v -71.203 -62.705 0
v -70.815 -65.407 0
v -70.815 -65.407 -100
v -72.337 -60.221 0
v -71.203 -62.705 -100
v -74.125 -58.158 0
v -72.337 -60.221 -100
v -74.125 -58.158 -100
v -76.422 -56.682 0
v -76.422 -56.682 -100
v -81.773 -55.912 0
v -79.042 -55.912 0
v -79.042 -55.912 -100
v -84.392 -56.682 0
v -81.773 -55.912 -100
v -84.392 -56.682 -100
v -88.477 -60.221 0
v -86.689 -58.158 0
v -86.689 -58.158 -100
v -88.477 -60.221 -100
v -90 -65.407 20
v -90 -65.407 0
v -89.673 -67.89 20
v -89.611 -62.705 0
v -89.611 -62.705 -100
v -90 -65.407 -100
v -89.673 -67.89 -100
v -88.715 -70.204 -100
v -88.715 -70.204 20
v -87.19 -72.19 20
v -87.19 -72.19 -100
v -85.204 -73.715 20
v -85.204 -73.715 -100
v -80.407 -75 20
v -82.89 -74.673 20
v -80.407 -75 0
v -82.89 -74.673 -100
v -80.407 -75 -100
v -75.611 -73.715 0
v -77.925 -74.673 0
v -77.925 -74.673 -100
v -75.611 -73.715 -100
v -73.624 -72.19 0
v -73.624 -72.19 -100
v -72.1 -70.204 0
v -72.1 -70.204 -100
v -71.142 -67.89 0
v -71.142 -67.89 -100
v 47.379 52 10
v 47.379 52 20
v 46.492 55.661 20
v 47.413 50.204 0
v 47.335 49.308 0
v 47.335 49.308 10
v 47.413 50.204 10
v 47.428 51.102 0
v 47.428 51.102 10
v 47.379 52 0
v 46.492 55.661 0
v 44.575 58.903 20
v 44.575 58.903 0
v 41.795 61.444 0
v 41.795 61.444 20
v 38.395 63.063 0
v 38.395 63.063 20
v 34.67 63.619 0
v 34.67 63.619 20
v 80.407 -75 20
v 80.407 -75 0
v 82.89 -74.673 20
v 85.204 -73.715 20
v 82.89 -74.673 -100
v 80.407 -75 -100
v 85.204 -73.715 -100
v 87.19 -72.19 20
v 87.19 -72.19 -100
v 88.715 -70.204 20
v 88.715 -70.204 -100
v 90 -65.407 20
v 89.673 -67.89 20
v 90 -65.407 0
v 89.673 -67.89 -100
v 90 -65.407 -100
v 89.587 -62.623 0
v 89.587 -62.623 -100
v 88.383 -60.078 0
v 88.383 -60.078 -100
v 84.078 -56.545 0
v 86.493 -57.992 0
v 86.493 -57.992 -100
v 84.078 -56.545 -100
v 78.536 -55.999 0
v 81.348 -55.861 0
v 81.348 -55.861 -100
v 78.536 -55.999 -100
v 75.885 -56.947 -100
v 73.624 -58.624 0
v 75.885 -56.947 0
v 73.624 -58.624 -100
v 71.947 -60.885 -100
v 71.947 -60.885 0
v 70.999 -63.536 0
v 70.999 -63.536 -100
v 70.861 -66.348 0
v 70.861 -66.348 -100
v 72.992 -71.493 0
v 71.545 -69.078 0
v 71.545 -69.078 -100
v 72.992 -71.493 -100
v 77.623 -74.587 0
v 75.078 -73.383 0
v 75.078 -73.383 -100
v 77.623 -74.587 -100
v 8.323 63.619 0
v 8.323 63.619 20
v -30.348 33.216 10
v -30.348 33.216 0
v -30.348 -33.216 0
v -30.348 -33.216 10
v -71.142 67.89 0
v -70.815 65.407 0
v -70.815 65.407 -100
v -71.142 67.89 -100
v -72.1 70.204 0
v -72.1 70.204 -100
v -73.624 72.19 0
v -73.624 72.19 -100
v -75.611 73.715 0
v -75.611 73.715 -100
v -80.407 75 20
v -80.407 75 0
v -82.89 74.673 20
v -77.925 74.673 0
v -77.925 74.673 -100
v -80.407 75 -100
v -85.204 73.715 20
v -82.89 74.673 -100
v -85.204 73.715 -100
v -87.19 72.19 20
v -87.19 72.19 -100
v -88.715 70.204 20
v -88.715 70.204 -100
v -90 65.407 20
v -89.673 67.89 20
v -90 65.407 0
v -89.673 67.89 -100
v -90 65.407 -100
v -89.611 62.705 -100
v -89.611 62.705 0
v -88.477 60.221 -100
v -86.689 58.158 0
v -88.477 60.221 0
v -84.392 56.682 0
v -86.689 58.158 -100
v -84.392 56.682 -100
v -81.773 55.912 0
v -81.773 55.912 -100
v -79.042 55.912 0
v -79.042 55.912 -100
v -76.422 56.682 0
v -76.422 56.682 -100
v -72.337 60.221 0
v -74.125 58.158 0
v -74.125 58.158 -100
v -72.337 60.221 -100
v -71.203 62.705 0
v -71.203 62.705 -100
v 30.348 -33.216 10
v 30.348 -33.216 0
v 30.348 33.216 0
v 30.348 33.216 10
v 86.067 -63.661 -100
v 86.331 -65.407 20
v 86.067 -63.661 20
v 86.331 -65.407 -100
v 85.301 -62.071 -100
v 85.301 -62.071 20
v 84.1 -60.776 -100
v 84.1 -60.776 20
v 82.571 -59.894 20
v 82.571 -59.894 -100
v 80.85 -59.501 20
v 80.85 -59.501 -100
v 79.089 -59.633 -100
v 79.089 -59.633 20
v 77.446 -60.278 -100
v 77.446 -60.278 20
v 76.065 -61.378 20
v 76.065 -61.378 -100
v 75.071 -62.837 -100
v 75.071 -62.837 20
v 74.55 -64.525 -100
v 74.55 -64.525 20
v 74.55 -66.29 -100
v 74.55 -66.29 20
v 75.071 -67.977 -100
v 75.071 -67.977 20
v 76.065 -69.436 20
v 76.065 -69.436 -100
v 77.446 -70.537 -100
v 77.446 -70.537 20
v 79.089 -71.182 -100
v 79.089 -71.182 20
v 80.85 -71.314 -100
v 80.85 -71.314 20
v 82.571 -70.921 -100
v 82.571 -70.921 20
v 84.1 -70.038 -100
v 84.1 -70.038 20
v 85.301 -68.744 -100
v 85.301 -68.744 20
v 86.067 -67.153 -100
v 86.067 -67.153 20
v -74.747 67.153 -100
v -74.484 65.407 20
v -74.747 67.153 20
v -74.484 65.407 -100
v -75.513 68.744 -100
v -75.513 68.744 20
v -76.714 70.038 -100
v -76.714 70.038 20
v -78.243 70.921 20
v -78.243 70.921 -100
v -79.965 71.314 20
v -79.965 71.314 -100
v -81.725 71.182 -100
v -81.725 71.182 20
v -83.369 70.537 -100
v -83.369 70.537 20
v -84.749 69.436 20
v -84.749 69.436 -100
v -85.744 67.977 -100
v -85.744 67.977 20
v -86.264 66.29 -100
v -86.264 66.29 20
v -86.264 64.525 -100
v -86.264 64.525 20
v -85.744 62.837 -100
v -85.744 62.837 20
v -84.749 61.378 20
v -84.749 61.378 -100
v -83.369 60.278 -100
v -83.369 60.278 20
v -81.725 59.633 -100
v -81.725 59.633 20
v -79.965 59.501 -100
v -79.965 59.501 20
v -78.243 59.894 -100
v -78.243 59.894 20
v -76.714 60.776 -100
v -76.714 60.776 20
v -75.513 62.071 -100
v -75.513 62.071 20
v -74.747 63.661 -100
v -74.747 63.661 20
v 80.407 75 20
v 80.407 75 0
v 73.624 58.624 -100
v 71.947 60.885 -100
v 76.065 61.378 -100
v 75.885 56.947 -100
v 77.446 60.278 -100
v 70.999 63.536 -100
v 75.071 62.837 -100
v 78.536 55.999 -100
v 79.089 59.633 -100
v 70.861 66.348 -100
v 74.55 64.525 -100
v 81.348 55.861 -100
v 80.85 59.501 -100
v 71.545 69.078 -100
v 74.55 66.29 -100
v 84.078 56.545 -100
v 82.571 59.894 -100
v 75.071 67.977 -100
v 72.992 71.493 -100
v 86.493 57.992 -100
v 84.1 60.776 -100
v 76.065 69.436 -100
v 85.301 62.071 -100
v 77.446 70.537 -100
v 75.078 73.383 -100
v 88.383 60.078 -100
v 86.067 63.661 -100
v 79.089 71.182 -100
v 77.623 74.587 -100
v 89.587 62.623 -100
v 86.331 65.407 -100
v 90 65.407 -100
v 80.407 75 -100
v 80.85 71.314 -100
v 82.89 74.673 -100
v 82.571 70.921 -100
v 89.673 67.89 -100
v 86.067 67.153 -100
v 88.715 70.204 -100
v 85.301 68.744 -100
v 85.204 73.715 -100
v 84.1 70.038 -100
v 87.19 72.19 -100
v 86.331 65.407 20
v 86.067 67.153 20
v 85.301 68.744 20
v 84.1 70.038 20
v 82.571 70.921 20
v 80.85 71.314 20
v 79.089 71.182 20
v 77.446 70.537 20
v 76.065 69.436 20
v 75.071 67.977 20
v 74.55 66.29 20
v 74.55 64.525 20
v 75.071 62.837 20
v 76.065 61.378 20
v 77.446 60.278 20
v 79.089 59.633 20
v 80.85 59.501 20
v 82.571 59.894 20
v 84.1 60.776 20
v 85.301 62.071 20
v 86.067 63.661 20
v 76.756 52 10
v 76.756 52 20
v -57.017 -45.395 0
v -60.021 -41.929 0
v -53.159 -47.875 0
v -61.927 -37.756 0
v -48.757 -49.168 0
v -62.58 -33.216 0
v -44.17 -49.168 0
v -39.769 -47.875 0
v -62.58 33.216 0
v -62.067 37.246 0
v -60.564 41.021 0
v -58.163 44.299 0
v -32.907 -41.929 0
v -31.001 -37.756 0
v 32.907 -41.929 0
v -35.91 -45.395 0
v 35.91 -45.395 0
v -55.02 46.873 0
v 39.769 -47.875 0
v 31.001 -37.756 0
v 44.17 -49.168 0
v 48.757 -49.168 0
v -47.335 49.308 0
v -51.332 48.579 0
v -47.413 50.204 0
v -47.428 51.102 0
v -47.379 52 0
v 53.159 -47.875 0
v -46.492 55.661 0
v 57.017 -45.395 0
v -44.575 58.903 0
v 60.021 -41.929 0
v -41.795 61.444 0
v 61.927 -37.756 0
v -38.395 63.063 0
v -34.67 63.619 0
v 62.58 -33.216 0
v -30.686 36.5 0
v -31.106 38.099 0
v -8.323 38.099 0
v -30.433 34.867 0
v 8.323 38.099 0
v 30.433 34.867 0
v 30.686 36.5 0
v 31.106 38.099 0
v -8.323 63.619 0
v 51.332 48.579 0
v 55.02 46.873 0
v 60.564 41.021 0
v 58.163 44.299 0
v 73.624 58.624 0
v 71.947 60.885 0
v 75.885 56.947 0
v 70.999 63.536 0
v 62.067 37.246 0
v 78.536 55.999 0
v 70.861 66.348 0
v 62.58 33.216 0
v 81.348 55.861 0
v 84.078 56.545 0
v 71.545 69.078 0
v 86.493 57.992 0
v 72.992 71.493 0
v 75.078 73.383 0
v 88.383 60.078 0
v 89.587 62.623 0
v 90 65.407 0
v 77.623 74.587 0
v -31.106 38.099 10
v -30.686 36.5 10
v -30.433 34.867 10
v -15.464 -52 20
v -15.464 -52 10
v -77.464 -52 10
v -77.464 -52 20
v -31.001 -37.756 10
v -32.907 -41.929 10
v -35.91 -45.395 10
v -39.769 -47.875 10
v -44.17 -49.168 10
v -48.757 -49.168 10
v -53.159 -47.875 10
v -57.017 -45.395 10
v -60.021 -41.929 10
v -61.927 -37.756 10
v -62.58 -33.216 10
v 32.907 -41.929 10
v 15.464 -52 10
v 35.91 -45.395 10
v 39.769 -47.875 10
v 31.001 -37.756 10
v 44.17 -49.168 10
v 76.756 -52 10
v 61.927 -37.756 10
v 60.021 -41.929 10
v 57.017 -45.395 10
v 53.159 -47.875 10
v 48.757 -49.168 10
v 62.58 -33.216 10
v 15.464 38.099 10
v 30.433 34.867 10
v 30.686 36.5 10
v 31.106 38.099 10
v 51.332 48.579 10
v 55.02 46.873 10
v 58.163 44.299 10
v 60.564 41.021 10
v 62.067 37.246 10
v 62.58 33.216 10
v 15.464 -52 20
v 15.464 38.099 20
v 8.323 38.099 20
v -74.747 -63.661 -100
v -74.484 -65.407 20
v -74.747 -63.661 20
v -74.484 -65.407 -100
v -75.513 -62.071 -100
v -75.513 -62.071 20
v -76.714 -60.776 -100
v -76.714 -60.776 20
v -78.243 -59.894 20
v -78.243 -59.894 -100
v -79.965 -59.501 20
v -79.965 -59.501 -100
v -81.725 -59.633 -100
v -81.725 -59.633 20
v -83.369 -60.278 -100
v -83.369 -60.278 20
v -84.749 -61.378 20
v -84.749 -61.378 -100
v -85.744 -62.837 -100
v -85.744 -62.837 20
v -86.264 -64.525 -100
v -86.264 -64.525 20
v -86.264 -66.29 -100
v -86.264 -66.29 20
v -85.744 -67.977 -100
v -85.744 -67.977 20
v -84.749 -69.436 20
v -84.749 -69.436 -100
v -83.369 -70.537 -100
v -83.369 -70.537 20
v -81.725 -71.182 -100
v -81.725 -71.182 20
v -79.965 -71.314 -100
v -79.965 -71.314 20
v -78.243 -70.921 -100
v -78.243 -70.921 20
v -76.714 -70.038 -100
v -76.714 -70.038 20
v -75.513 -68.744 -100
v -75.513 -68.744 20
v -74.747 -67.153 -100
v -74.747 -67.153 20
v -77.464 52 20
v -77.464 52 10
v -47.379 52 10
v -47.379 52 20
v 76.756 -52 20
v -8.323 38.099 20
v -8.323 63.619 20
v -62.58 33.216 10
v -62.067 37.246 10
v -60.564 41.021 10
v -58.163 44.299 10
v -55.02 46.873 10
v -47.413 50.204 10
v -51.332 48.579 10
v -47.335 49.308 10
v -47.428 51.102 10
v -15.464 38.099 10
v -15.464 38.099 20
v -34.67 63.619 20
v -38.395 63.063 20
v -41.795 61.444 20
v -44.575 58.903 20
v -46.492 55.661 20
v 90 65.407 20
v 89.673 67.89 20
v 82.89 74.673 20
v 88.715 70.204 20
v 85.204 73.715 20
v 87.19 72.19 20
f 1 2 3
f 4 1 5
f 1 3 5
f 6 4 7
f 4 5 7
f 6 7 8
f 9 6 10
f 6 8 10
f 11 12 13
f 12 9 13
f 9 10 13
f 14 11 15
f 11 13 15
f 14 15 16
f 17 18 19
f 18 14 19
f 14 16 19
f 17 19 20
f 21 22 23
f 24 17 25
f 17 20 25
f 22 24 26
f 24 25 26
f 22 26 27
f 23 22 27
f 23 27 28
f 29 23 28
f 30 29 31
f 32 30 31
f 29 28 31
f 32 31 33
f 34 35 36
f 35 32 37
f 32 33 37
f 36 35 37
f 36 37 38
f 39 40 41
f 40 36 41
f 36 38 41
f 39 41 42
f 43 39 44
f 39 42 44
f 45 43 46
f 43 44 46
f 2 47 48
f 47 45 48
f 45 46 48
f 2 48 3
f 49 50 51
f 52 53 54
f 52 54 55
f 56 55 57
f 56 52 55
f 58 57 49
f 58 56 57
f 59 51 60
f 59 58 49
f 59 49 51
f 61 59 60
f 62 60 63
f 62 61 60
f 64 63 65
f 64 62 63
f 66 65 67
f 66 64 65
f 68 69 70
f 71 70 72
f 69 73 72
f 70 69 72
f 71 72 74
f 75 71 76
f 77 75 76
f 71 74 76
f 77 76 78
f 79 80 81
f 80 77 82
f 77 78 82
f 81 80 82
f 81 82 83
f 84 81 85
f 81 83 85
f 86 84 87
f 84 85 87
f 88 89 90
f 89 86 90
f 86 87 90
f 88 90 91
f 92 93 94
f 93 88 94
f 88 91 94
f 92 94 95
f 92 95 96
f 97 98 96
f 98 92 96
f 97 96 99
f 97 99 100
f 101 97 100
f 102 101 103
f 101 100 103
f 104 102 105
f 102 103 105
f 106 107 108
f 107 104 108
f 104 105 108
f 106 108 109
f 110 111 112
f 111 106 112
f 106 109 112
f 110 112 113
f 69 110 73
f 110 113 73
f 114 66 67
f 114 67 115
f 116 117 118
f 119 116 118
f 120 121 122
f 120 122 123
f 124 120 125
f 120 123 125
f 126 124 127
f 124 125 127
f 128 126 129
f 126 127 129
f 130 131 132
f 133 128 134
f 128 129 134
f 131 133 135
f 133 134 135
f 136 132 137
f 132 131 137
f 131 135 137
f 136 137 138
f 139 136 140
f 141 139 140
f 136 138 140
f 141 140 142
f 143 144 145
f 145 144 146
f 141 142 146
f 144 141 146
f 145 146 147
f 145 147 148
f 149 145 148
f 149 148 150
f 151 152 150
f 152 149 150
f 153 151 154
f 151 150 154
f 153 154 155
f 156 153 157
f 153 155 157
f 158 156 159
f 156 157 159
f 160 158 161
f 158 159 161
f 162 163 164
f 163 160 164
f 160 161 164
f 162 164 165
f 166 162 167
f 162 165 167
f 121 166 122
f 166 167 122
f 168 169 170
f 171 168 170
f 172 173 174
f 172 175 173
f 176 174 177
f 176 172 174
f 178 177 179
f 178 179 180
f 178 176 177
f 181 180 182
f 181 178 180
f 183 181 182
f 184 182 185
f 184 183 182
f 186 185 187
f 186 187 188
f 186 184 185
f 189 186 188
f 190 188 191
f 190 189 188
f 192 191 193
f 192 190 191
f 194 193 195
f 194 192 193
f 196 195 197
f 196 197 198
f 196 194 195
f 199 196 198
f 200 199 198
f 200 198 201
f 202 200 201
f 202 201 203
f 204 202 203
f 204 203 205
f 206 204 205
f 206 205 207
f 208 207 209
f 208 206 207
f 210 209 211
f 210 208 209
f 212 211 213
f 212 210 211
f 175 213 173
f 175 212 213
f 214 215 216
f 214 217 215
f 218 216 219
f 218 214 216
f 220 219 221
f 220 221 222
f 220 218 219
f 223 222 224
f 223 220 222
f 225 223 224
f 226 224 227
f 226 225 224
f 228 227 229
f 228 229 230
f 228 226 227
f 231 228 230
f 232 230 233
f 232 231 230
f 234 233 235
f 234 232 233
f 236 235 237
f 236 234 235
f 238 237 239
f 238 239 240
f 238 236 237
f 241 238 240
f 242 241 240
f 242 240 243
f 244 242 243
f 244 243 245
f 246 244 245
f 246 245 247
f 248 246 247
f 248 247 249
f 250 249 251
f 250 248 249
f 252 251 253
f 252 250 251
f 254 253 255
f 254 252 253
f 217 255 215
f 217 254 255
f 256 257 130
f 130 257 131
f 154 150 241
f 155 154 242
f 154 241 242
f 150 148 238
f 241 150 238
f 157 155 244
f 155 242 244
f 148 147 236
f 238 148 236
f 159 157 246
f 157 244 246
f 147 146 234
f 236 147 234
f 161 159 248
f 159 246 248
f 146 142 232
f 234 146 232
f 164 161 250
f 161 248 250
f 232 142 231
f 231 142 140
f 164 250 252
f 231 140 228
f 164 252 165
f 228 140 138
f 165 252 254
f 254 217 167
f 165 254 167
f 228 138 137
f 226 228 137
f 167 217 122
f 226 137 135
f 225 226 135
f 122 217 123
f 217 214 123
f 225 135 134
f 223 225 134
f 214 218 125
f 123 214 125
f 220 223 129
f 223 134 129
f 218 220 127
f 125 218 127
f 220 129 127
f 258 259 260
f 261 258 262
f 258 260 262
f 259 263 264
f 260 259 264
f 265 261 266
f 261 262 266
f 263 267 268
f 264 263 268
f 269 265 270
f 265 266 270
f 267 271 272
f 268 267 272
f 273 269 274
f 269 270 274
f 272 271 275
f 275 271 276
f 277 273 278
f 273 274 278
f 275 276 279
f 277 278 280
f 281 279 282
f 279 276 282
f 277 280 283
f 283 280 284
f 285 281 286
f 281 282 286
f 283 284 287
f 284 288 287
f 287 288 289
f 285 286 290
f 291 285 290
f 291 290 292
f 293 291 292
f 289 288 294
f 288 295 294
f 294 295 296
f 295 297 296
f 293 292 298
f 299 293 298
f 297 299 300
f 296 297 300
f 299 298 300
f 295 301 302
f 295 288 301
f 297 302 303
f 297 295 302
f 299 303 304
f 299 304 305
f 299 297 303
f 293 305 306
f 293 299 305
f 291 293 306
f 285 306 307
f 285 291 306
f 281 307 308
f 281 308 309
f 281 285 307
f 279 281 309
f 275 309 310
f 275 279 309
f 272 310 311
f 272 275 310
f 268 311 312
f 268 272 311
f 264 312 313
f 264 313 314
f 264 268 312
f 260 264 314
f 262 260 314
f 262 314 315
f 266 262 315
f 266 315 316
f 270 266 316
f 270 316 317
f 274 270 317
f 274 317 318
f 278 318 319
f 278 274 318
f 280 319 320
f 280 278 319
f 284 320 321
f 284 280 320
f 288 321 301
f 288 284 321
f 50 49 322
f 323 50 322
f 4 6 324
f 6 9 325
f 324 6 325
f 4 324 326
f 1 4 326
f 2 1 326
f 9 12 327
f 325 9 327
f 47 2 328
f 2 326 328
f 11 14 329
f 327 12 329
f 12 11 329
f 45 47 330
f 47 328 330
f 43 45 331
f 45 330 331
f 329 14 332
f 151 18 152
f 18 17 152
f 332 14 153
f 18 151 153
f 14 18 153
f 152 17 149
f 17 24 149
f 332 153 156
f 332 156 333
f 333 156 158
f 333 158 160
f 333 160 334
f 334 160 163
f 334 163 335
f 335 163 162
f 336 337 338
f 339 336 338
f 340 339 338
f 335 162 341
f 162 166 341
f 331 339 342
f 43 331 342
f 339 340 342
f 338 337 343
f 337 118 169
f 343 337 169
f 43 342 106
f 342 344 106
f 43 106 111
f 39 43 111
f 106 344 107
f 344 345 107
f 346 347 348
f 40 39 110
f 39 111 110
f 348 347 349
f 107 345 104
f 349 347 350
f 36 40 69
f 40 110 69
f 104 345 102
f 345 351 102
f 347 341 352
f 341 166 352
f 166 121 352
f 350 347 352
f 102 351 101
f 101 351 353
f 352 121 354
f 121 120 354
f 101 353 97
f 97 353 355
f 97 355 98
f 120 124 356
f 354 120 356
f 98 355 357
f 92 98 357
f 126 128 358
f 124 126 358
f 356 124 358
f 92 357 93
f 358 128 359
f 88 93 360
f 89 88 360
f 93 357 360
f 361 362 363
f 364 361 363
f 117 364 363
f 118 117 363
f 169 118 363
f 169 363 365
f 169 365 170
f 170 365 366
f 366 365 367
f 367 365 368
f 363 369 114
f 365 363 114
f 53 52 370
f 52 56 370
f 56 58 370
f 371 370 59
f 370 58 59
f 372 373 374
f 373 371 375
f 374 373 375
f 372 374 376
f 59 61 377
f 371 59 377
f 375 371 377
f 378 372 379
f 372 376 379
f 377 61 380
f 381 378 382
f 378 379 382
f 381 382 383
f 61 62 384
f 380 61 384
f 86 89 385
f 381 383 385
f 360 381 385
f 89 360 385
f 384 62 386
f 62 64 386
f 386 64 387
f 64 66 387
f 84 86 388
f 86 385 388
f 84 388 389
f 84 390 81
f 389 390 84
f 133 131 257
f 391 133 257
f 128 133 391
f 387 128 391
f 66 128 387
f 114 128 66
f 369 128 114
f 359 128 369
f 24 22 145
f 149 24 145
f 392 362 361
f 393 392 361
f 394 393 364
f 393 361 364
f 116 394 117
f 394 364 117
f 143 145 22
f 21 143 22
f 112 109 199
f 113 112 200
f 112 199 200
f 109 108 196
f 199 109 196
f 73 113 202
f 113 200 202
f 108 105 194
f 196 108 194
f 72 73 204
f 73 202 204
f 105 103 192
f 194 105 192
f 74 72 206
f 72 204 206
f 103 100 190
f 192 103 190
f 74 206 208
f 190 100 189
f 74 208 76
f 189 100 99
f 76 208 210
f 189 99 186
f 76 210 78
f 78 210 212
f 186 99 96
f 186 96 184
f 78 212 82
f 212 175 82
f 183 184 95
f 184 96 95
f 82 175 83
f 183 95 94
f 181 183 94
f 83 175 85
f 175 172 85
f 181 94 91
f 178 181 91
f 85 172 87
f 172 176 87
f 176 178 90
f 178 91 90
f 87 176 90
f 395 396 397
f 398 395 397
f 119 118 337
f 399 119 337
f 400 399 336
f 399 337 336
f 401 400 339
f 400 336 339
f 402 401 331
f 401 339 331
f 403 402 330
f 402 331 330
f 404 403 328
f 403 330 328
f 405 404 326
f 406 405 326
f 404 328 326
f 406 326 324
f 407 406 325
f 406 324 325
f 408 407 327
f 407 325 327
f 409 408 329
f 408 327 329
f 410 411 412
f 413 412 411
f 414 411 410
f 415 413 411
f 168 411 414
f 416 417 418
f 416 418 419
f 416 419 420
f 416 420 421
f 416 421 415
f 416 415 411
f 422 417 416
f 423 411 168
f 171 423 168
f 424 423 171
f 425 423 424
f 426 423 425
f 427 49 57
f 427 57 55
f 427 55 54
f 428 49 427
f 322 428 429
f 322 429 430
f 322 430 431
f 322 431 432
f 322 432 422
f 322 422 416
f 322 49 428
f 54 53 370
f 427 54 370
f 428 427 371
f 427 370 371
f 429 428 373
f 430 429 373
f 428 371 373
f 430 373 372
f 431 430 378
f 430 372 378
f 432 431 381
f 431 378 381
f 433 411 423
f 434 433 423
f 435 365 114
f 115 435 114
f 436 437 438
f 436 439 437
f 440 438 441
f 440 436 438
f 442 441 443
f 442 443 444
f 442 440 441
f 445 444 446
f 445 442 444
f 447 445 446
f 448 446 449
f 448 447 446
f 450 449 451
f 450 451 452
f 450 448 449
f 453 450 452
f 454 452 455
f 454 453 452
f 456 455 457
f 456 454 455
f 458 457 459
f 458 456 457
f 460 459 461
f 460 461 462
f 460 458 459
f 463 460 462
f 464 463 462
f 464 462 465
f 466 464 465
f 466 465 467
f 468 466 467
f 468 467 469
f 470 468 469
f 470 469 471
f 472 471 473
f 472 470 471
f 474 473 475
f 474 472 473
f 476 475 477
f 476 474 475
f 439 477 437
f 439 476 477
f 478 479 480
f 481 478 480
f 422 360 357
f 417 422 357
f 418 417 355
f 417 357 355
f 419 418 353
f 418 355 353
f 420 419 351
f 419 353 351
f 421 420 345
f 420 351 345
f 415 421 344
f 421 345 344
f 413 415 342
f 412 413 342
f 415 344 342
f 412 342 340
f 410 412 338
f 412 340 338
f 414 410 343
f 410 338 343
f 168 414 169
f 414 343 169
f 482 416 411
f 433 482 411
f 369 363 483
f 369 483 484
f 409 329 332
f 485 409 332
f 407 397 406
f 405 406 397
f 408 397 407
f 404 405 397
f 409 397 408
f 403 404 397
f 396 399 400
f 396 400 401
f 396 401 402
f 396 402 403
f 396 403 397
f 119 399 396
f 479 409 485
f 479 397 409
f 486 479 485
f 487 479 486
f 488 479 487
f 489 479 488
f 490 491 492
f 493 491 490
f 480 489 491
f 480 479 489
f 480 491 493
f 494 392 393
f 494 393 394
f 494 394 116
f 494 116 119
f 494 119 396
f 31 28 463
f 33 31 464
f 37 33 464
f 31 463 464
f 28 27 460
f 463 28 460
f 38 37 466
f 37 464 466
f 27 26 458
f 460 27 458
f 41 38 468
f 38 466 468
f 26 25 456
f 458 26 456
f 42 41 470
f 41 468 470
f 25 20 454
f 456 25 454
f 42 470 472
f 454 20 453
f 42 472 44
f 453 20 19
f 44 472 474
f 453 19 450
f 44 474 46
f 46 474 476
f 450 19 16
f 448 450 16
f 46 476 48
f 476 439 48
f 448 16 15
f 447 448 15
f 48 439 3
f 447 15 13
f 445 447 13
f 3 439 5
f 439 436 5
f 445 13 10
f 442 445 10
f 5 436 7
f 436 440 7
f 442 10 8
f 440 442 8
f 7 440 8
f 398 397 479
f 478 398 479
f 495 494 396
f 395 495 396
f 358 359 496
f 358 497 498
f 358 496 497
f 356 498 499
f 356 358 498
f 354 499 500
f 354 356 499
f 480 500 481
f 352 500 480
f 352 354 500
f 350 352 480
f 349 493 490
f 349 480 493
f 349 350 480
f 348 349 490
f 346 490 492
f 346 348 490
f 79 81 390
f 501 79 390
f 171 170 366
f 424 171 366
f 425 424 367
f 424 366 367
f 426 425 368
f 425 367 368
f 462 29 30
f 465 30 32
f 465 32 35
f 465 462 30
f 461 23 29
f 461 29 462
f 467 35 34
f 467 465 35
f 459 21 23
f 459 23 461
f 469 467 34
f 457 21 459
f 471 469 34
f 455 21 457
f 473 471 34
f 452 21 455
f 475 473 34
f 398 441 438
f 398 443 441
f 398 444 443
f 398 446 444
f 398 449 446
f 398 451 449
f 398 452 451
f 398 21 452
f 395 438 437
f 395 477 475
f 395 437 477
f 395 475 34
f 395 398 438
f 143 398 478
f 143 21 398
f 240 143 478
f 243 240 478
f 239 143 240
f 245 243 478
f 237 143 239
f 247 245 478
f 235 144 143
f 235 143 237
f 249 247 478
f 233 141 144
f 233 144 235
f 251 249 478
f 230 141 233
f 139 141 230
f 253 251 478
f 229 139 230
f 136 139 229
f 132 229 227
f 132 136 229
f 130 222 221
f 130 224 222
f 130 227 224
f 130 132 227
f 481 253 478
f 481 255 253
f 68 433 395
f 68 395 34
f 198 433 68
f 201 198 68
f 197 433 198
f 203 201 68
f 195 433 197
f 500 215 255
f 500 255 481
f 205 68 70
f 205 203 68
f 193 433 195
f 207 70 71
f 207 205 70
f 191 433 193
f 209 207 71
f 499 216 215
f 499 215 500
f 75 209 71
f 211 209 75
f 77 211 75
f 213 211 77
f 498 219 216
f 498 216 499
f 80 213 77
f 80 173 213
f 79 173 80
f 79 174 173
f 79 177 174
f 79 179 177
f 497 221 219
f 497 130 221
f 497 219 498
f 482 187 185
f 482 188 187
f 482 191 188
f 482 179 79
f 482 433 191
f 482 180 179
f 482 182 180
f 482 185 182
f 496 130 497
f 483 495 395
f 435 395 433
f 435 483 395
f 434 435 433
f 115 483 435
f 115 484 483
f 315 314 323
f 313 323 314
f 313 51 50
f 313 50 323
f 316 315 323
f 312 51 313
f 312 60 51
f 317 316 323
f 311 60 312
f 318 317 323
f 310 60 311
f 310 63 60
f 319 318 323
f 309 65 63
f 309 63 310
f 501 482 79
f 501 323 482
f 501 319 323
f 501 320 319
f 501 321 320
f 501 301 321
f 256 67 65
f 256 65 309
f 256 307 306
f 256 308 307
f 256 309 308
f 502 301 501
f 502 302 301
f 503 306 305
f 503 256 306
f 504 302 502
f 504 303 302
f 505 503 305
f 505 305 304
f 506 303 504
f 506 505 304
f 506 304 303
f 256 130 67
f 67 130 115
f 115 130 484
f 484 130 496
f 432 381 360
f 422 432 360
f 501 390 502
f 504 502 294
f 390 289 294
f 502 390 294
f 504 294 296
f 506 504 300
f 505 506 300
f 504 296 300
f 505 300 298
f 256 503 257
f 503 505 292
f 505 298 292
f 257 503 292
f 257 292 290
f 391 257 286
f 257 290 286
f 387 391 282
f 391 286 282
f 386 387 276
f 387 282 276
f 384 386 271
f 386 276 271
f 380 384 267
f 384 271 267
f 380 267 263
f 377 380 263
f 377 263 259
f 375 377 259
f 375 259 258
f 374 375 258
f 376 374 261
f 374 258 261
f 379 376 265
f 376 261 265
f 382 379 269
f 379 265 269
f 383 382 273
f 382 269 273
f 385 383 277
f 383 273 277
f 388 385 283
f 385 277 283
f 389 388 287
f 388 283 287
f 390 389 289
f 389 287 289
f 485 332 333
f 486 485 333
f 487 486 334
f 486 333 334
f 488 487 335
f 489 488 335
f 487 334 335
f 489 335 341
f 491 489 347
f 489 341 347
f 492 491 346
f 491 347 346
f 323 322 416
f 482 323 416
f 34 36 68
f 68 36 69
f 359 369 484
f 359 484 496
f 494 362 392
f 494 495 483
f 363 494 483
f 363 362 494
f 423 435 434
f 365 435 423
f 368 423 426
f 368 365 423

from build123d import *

# Parameters (mm, degrees)
EXTRUDE_1_DEPTH          = 20
EXTRUDE_2_DEPTH          = 10
EXTRUDE_3_DEPTH          = 20
CUT_EXTRUDE_4_DEPTH      = 5
EXTRUDE_START            = -100
SKETCH_1_11_R            = 9.592658998
SKETCH_1_11_R_2          = 5.923282924
EXTRUDE_5_DEPTH          = 100
EXTRUDE_5_2_DEPTH        = 100
EXTRUDE_5_3_DEPTH        = 100
EXTRUDE_5_4_DEPTH        = 100
CUT_EXTRUDE_5_DEPTH      = 155.029218007
CUT_EXTRUDE_5_DEPTH_BACK = 12
SKETCH_1_15_R            = 9.592658998
SKETCH_1_15_R_2          = 5.923282924
EXTRUDE_7_DEPTH          = 20


with BuildPart() as part:
    # 草图1 → 凸台-拉伸1 (new body)
    with BuildSketch(Plane.XY):
        with BuildLine():
            Line((80.407341002, 75), (-80.407341002, 75))
            ThreePointArc((-80.407341002, 75), (-73.624306776, 72.190375229), (-70.814682005, 65.407341002))
            ThreePointArc((-70.814682005, 65.407341002), (-80.407341002, 55.814682005), (-90, 65.407341002))
            Line((-90, 65.407341002), (-90, -65.407341002))
            ThreePointArc((-90, -65.407341002), (-80.407341002, -55.814682005), (-70.814682005, -65.407341002))
            ThreePointArc((-70.814682005, -65.407341002), (-73.624306776, -72.190375229), (-80.407341002, -75))
            Line((-80.407341002, -75), (80.407341002, -75))
            ThreePointArc((80.407341002, -75), (73.624306776, -58.624306776), (90, -65.407341002))
            Line((90, -65.407341002), (90, 65.407341002))
            ThreePointArc((90, 65.407341002), (73.624306776, 58.624306776), (80.407341002, 75))
        make_face()
        with BuildLine():
            Line((-77.463981191, -52), (-77.463981191, 52))
            Line((-77.463981191, 52), (-47.378758628, 52))
            ThreePointArc((-47.378758628, 52), (-43.279624238, 60.276513692), (-34.66969867, 63.619082069))
            Line((-34.66969867, 63.619082069), (-8.32333029, 63.619082069))
            ThreePointArc((-8.32333029, 63.619082069), (0, 71.942412359), (8.32333029, 63.619082069))
            Line((8.32333029, 63.619082069), (34.66969867, 63.619082069))
            ThreePointArc((34.66969867, 63.619082069), (43.279624238, 60.276513692), (47.378758628, 52))
            Line((47.378758628, 52), (76.756459617, 52))
            Line((76.756459617, 52), (76.756459617, -52))
            Line((76.756459617, -52), (15.463981191, -52))
            Line((15.463981191, -52), (15.463981191, 38.098712095))
            Line((15.463981191, 38.098712095), (8.32333029, 38.098712095))
            ThreePointArc((8.32333029, 38.098712095), (0, 29.775381805), (-8.32333029, 38.098712095))
            Line((-8.32333029, 38.098712095), (-15.463981191, 38.098712095))
            Line((-15.463981191, 38.098712095), (-15.463981191, -52))
            Line((-15.463981191, -52), (-77.463981191, -52))
        make_face(mode=Mode.SUBTRACT)
    extrude(amount=EXTRUDE_1_DEPTH)

    # 草图1<3> → 凸台-拉伸2 (add)
    with BuildSketch(Plane.XY):
        with BuildLine():
            Line((-47.378758628, 52), (-77.463981191, 52))
            Line((-77.463981191, 52), (-77.463981191, -52))
            Line((-77.463981191, -52), (-15.463981191, -52))
            Line((-15.463981191, -52), (-15.463981191, 38.098712095))
            Line((-15.463981191, 38.098712095), (-31.105836296, 38.098712095))
            ThreePointArc((-31.105836296, 38.098712095), (-30.538825138, 35.686508189), (-30.348320097, 33.215893454))
            Line((-30.348320097, 33.215893454), (-30.348320097, -33.215893454))
            ThreePointArc((-30.348320097, -33.215893454), (-46.463981191, -49.331554547), (-62.579642285, -33.215893454))
            Line((-62.579642285, -33.215893454), (-62.579642285, 33.215893454))
            ThreePointArc((-62.579642285, 33.215893454), (-58.163470775, 44.299055275), (-47.335281505, 49.307983692))
            ThreePointArc((-47.335281505, 49.307983692), (-47.428219829, 50.652841942), (-47.378758628, 52))
        make_face()
        with BuildLine():
            Line((31.105836296, 38.098712095), (15.463981191, 38.098712095))
            Line((15.463981191, 38.098712095), (15.463981191, -52))
            Line((15.463981191, -52), (76.756459617, -52))
            Line((76.756459617, -52), (76.756459617, 52))
            Line((76.756459617, 52), (47.378758628, 52))
            ThreePointArc((47.378758628, 52), (47.428219829, 50.652841942), (47.335281505, 49.307983692))
            ThreePointArc((47.335281505, 49.307983692), (58.163470775, 44.299055275), (62.579642285, 33.215893454))
            Line((62.579642285, 33.215893454), (62.579642285, -33.215893454))
            ThreePointArc((62.579642285, -33.215893454), (46.463981191, -49.331554547), (30.348320097, -33.215893454))
            Line((30.348320097, -33.215893454), (30.348320097, 33.215893454))
            ThreePointArc((30.348320097, 33.215893454), (30.538825138, 35.686508189), (31.105836296, 38.098712095))
        make_face()
    extrude(amount=EXTRUDE_2_DEPTH)

    # 草图1<4> → 凸台-拉伸3 (add)
    with BuildSketch(Plane.XY):
        with BuildLine():
            ThreePointArc((-34.66969867, 63.619082069), (-47.429883657, 50.858897082), (-34.66969867, 38.098712095))
            Line((-34.66969867, 38.098712095), (-8.32333029, 38.098712095))
            Line((-8.32333029, 38.098712095), (-8.32333029, 63.619082069))
            Line((-8.32333029, 63.619082069), (-34.66969867, 63.619082069))
        make_face()
        with BuildLine():
            Line((34.66969867, 63.619082069), (8.32333029, 63.619082069))
            Line((8.32333029, 63.619082069), (8.32333029, 38.098712095))
            Line((8.32333029, 38.098712095), (34.66969867, 38.098712095))
            ThreePointArc((34.66969867, 38.098712095), (47.429883657, 50.858897082), (34.66969867, 63.619082069))
        make_face()
    extrude(amount=EXTRUDE_3_DEPTH)

    # 草图1<8> → 切除-拉伸4 (cut, symmetric)
    with BuildSketch(Plane.XY):
        with BuildLine():
            ThreePointArc((-34.66969867, 63.619082069), (-47.429883657, 50.858897082), (-34.66969867, 38.098712095))
            Line((-34.66969867, 38.098712095), (-8.32333029, 38.098712095))
            Line((-8.32333029, 38.098712095), (-8.32333029, 63.619082069))
            Line((-8.32333029, 63.619082069), (-34.66969867, 63.619082069))
        make_face()
        with BuildLine():
            Line((34.66969867, 63.619082069), (8.32333029, 63.619082069))
            Line((8.32333029, 63.619082069), (8.32333029, 38.098712095))
            Line((8.32333029, 38.098712095), (34.66969867, 38.098712095))
            ThreePointArc((34.66969867, 38.098712095), (47.429883657, 50.858897082), (34.66969867, 63.619082069))
        make_face()
    extrude(amount=CUT_EXTRUDE_4_DEPTH, both=True, mode=Mode.SUBTRACT)

    # 草图1<14> → 切除-拉伸5 (cut, two sides: drawn at the far end of the back side and taken through both)
    with BuildSketch(Plane.XY.offset(-CUT_EXTRUDE_5_DEPTH_BACK)):
        with BuildLine():
            ThreePointArc((-34.66969867, 63.619082069), (-47.429883657, 50.858897082), (-34.66969867, 38.098712095))
            Line((-34.66969867, 38.098712095), (-8.32333029, 38.098712095))
            Line((-8.32333029, 38.098712095), (-8.32333029, 63.619082069))
            Line((-8.32333029, 63.619082069), (-34.66969867, 63.619082069))
        make_face()
        with BuildLine():
            Line((34.66969867, 63.619082069), (8.32333029, 63.619082069))
            Line((8.32333029, 63.619082069), (8.32333029, 38.098712095))
            Line((8.32333029, 38.098712095), (34.66969867, 38.098712095))
            ThreePointArc((34.66969867, 38.098712095), (47.429883657, 50.858897082), (34.66969867, 63.619082069))
        make_face()
    extrude(amount=CUT_EXTRUDE_5_DEPTH + CUT_EXTRUDE_5_DEPTH_BACK, mode=Mode.SUBTRACT)



with BuildPart() as body_2:
    # 草图1<11> → 凸台-拉伸5 (new body)
    with BuildSketch(Plane.XY.offset(EXTRUDE_START)):
        with Locations((-80.407341002, 65.407341002)):
            Circle(SKETCH_1_11_R)
        with Locations((-80.407341002, 65.407341002)):
            Circle(SKETCH_1_11_R_2, mode=Mode.SUBTRACT)
    extrude(amount=EXTRUDE_5_DEPTH)


with BuildPart() as body_3:
    # 草图1<11> → Extrude 5 2 (new body)
    with BuildSketch(Plane.XY.offset(EXTRUDE_START)):
        with Locations((80.407341002, 65.407341002)):
            Circle(SKETCH_1_11_R)
        with Locations((80.407341002, 65.407341002)):
            Circle(SKETCH_1_11_R_2, mode=Mode.SUBTRACT)
    extrude(amount=EXTRUDE_5_2_DEPTH)


with BuildPart() as body_4:
    # 草图1<11> → Extrude 5 3 (new body)
    with BuildSketch(Plane.XY.offset(EXTRUDE_START)):
        with Locations((-80.407341002, -65.407341002)):
            Circle(SKETCH_1_11_R)
        with Locations((-80.407341002, -65.407341002)):
            Circle(SKETCH_1_11_R_2, mode=Mode.SUBTRACT)
    extrude(amount=EXTRUDE_5_3_DEPTH)


with BuildPart() as body_5:
    # 草图1<11> → Extrude 5 4 (new body)
    with BuildSketch(Plane.XY.offset(EXTRUDE_START)):
        with Locations((80.407341002, -65.407341002)):
            Circle(SKETCH_1_11_R)
        with Locations((80.407341002, -65.407341002)):
            Circle(SKETCH_1_11_R_2, mode=Mode.SUBTRACT)
    extrude(amount=EXTRUDE_5_4_DEPTH)


with BuildPart() as part_1:
    add(part.part)

    add(body_2.part)  # 凸台-拉伸7 merges body 2

    add(body_3.part)  # 凸台-拉伸7 merges body 3

    add(body_4.part)  # 凸台-拉伸7 merges body 4

    add(body_5.part)  # 凸台-拉伸7 merges body 5
    # 草图1<15> → 凸台-拉伸7 (add)
    # profile 1 of 5: a face of its own
    with BuildSketch(Plane.XY):
        with Locations((-80.407341002, 65.407341002)):
            Circle(SKETCH_1_15_R)
        with Locations((-80.407341002, 65.407341002)):
            Circle(SKETCH_1_15_R_2, mode=Mode.SUBTRACT)
    # profile 2 of 5: a face of its own
    with BuildSketch(Plane.XY):
        with Locations((80.407341002, 65.407341002)):
            Circle(SKETCH_1_15_R)
        with Locations((80.407341002, 65.407341002)):
            Circle(SKETCH_1_15_R_2, mode=Mode.SUBTRACT)
    # profile 3 of 5: a face of its own
    with BuildSketch(Plane.XY):
        with Locations((-80.407341002, -65.407341002)):
            Circle(SKETCH_1_15_R)
        with Locations((-80.407341002, -65.407341002)):
            Circle(SKETCH_1_15_R_2, mode=Mode.SUBTRACT)
    # profile 4 of 5: a face of its own
    with BuildSketch(Plane.XY):
        with Locations((80.407341002, -65.407341002)):
            Circle(SKETCH_1_15_R)
        with Locations((80.407341002, -65.407341002)):
            Circle(SKETCH_1_15_R_2, mode=Mode.SUBTRACT)
    # profile 5 of 5: a face of its own
    with BuildSketch(Plane.XY):
        with BuildLine():
            ThreePointArc((8.32333029, 63.619082069), (0, 71.942412359), (-8.32333029, 63.619082069))
            Line((-8.32333029, 63.619082069), (-8.32333029, 38.098712095))
            ThreePointArc((-8.32333029, 38.098712095), (0, 29.775381805), (8.32333029, 38.098712095))
            Line((8.32333029, 38.098712095), (8.32333029, 63.619082069))
        make_face()
    extrude(amount=EXTRUDE_7_DEPTH)


solid = part_1.part
